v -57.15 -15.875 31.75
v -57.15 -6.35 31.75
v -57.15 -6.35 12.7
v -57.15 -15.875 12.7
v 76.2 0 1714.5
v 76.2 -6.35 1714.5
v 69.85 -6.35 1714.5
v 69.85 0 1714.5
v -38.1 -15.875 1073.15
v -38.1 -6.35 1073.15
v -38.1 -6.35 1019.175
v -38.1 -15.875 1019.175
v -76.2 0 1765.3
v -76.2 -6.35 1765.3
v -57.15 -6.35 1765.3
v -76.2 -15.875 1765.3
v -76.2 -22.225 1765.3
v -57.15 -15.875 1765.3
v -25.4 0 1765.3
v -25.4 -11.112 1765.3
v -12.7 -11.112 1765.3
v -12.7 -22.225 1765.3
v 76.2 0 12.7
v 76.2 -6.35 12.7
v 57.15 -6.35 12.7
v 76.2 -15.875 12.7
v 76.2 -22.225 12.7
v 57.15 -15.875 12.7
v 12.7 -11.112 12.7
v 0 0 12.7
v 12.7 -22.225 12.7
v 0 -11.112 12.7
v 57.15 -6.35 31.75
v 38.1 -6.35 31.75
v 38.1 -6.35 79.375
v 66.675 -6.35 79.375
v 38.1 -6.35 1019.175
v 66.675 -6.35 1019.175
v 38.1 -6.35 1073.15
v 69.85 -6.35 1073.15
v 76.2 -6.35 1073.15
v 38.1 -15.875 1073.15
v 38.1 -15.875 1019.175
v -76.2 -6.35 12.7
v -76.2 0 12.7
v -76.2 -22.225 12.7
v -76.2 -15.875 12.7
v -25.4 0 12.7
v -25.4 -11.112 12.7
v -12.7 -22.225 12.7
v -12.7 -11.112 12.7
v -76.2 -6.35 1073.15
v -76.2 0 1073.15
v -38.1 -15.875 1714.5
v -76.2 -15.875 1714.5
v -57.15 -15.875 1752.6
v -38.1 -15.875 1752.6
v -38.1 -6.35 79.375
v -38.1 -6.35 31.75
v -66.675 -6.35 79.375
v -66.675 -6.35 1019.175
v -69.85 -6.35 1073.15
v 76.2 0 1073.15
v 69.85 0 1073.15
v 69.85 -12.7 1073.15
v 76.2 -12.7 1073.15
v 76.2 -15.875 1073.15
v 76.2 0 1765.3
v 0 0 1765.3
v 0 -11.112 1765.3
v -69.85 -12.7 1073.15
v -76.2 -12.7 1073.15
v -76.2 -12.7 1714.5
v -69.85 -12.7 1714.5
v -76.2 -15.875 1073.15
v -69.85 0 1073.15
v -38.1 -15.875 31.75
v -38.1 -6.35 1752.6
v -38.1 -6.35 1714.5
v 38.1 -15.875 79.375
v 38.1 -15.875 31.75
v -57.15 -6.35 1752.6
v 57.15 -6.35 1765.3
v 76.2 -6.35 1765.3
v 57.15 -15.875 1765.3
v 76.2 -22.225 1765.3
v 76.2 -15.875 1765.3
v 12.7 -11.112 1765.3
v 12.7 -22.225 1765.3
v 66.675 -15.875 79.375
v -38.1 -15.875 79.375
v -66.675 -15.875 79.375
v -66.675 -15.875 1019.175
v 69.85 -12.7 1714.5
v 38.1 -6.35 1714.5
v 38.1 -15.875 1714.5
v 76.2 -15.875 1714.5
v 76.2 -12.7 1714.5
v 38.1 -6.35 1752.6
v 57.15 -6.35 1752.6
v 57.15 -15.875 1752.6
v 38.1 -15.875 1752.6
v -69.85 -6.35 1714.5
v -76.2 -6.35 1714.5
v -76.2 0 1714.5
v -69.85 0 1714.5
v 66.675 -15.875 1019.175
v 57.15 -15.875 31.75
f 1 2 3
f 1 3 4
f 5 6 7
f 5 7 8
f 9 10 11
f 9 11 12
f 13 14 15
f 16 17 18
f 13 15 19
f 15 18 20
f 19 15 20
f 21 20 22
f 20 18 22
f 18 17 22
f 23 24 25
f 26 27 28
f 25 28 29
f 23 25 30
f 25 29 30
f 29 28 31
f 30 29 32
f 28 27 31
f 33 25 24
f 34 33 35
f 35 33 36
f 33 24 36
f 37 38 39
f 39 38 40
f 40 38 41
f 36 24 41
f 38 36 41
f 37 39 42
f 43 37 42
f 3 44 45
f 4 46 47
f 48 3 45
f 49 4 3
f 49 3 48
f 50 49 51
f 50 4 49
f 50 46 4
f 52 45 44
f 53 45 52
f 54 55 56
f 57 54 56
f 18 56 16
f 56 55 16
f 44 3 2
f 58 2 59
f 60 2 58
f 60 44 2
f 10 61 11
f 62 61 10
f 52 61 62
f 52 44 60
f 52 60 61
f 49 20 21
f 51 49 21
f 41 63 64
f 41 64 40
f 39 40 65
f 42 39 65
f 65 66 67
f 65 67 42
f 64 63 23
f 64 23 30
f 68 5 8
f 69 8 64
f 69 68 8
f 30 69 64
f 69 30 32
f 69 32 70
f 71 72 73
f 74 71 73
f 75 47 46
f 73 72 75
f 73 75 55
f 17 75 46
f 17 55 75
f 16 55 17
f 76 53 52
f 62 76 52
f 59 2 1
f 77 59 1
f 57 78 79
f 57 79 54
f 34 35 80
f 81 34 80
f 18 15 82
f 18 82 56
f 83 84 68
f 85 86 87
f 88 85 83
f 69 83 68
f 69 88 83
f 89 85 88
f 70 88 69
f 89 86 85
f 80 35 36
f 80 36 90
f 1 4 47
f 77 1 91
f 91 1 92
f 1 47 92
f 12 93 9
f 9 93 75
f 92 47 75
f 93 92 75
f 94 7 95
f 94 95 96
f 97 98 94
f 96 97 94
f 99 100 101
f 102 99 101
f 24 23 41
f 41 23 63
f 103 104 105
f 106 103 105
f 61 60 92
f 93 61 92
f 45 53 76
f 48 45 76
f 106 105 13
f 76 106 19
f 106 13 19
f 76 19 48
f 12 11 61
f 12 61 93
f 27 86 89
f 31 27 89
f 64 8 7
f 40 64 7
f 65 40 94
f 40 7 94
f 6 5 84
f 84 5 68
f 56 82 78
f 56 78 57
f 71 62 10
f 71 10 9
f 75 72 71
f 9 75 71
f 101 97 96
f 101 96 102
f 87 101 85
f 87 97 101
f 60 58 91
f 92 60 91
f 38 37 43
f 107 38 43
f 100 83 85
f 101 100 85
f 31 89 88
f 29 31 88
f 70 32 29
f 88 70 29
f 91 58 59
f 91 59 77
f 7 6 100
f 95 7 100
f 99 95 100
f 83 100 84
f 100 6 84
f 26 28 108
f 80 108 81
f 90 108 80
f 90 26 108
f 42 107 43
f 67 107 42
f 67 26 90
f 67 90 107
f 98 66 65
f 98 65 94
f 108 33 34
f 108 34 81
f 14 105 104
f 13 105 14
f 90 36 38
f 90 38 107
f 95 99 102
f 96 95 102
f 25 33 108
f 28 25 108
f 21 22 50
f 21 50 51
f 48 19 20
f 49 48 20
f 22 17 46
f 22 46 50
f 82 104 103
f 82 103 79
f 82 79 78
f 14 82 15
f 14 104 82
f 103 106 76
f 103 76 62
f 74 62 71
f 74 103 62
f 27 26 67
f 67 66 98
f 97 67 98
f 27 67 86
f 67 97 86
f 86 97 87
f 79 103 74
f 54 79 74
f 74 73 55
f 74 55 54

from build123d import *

# Parameters (mm, degrees)
F0_W      = 76.2
F0_H      = 1778
F1_DEPTH  = 22.225
F2_W      = 9.525
F2_H      = 38.1
F2_H_2    = 47.625
F2_H_3    = 53.975
F3_DEPTH  = 38.1
F2_H_4    = 25.4
F2_H_5    = 31.75
F4_DEPTH  = 19.05
F5_W      = 76.2
F5_H      = 12.7
F6_DEPTH  = 22.226
F7_W      = 9.525
F7_H      = 939.8
F8_DEPTH  = 9.525
F10_DEPTH = 6.35
F12_W     = 12.7
F12_H     = 11.1125
F13_DEPTH = 1752.6
F14_W     = 12.7
F14_H     = 11.1125
F15_DEPTH = 1752.6


with BuildPart() as f1:
    # F0 (on Front) → F1 (new body)
    with BuildSketch(Plane.XZ):
        with Locations((-38.1, 889)):
            Rectangle(F0_W, F0_H)
    extrude(amount=F1_DEPTH)

    # F2 (on face) → F3 (cut)
    with BuildSketch(Plane(origin=(-76.2, 0, 0), x_dir=(0, -1, 0), z_dir=(-1, 0, 0))):
        with Locations((11.1125, 1733.55)):
            Rectangle(F2_W, F2_H)
        with Locations((11.1125, 55.5625)):
            Rectangle(F2_W, F2_H_2)
        with Locations((11.1125, 1046.1625)):
            Rectangle(F2_W, F2_H_3)
    extrude(amount=-F3_DEPTH, mode=Mode.SUBTRACT)

    # F2 (on face) → F4 (cut)
    with BuildSketch(Plane(origin=(-76.2, 0, 0), x_dir=(0, -1, 0), z_dir=(-1, 0, 0))):
        with Locations((11.1125, 1765.3)):
            Rectangle(F2_W, F2_H_4)
        with Locations((11.1125, 15.875)):
            Rectangle(F2_W, F2_H_5)
    extrude(amount=-F4_DEPTH, mode=Mode.SUBTRACT)

    # F5 (on face) → F6 (cut, through all)
    with BuildSketch(Plane.XZ.offset(22.225)):
        with Locations((-38.1, 1771.65)):
            Rectangle(F5_W, F5_H)
        with Locations((-38.1, 6.35)):
            Rectangle(F5_W, F5_H)
    extrude(amount=-F6_DEPTH, mode=Mode.SUBTRACT)

    # F7 (on face) → F8 (cut)
    with BuildSketch(Plane(origin=(-76.2, 0, 0), x_dir=(0, -1, 0), z_dir=(-1, 0, 0))):
        with Locations((11.1125, 549.275)):
            Rectangle(F7_W, F7_H)
    extrude(amount=-F8_DEPTH, mode=Mode.SUBTRACT)

    # F9 (on face) → F10 (cut)
    with BuildSketch(Plane(origin=(-76.2, 0, 0), x_dir=(0, -1, 0), z_dir=(-1, 0, 0))):
        Polygon((6.35, 1714.5), (0, 1714.5), (0, 1073.15), (6.35, 1073.15), (12.7, 1073.15), (12.7, 1714.5), align=None)
    extrude(amount=-F10_DEPTH, mode=Mode.SUBTRACT)


with BuildPart() as f11_1:
    # F11: instance of F1
    add(f1.part.mirror(Plane.YZ))

    # F14 (on face) → F15 (cut, through all)
    with BuildSketch(Plane.XY.offset(1765.3)):
        with Locations((6.35, -16.66875)):
            Rectangle(F14_W, F14_H)
    extrude(amount=-F15_DEPTH, mode=Mode.SUBTRACT)


with BuildPart() as f1_1:
    add(f1.part)

    # F12 (on face) → F13 (cut, through all)
    with BuildSketch(Plane.XY.offset(1765.3)):
        Polygon((0, 0), (-25.4, 0), (-25.4, -11.1125), (-12.7, -11.1125), (0, -11.1125), align=None)
        with Locations((-6.35, -16.66875)):
            Rectangle(F12_W, F12_H)
    extrude(amount=-F13_DEPTH, mode=Mode.SUBTRACT)


solid = Compound([f11_1.part, f1_1.part])
